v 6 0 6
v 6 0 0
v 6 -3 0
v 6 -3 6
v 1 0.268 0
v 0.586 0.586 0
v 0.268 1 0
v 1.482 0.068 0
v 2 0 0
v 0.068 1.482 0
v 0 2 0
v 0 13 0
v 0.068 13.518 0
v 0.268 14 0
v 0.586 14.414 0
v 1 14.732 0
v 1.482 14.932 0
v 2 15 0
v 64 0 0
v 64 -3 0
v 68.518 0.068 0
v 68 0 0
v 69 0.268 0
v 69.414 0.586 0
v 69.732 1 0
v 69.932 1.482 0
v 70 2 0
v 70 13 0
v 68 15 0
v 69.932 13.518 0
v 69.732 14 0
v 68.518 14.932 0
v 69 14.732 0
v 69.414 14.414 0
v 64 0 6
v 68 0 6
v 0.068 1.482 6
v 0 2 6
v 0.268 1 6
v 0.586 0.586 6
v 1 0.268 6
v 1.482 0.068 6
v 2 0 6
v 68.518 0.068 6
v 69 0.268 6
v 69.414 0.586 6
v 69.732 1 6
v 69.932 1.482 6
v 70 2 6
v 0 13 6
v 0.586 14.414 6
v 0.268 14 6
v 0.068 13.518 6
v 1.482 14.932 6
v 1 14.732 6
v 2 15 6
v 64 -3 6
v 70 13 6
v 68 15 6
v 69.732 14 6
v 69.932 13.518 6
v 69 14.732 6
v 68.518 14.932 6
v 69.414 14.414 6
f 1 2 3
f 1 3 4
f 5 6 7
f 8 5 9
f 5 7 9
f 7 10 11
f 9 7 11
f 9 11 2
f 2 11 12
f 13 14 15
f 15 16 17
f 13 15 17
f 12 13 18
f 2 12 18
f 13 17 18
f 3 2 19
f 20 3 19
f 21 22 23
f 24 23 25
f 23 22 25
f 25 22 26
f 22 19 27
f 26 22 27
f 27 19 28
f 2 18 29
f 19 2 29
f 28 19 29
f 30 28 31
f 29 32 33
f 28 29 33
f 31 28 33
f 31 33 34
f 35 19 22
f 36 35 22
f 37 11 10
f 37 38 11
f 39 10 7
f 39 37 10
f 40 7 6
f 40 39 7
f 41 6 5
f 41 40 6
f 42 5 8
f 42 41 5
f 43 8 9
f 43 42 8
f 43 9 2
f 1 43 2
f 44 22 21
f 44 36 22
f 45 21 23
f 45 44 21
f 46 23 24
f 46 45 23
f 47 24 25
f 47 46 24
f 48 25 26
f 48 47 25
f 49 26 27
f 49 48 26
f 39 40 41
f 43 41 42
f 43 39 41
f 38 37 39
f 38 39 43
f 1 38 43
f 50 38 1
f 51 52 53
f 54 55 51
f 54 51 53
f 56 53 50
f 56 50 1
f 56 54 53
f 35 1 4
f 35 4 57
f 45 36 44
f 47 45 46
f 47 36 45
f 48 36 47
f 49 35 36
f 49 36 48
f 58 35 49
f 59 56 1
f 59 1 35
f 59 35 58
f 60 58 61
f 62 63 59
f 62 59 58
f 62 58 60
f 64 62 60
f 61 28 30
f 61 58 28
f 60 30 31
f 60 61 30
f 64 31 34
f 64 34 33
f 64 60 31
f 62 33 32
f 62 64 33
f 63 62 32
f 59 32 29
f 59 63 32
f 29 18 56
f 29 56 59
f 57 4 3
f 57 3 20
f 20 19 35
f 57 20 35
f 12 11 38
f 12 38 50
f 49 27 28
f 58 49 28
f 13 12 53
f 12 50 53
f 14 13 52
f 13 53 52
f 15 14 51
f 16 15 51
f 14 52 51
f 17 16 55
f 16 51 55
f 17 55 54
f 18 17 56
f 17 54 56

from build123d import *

# Parameters (mm, degrees)
SKETCH_1_W      = 70
SKETCH_1_H      = 15
EXTRUDE_1_DEPTH = 6
FILLET_1_R      = 2
SKETCH_2_W      = 58
SKETCH_2_H      = 6
EXTRUDE_2_DEPTH = 3


with BuildPart() as part:
    # Эскиз1 → Бобышка-Вытянуть1 (new body)
    with BuildSketch(Plane.XY):
        with Locations((35, 7.5)):
            Rectangle(SKETCH_1_W, SKETCH_1_H)
    extrude(amount=EXTRUDE_1_DEPTH)

    # Скругление1
    fillet_1_edges = [part.edges().sort_by_distance(p)[0] for p in [
        (0, 15, 3),
        (70, 15, 3),
        (70, 0, 3),
        (0, 0, 3),
    ]]
    fillet(fillet_1_edges, radius=FILLET_1_R)

    # Эскиз2 → Бобышка-Вытянуть2 (add)
    with BuildSketch(Plane.XZ):
        with Locations((35, 3)):
            Rectangle(SKETCH_2_W, SKETCH_2_H)
    extrude(amount=EXTRUDE_2_DEPTH)


solid = part.part
